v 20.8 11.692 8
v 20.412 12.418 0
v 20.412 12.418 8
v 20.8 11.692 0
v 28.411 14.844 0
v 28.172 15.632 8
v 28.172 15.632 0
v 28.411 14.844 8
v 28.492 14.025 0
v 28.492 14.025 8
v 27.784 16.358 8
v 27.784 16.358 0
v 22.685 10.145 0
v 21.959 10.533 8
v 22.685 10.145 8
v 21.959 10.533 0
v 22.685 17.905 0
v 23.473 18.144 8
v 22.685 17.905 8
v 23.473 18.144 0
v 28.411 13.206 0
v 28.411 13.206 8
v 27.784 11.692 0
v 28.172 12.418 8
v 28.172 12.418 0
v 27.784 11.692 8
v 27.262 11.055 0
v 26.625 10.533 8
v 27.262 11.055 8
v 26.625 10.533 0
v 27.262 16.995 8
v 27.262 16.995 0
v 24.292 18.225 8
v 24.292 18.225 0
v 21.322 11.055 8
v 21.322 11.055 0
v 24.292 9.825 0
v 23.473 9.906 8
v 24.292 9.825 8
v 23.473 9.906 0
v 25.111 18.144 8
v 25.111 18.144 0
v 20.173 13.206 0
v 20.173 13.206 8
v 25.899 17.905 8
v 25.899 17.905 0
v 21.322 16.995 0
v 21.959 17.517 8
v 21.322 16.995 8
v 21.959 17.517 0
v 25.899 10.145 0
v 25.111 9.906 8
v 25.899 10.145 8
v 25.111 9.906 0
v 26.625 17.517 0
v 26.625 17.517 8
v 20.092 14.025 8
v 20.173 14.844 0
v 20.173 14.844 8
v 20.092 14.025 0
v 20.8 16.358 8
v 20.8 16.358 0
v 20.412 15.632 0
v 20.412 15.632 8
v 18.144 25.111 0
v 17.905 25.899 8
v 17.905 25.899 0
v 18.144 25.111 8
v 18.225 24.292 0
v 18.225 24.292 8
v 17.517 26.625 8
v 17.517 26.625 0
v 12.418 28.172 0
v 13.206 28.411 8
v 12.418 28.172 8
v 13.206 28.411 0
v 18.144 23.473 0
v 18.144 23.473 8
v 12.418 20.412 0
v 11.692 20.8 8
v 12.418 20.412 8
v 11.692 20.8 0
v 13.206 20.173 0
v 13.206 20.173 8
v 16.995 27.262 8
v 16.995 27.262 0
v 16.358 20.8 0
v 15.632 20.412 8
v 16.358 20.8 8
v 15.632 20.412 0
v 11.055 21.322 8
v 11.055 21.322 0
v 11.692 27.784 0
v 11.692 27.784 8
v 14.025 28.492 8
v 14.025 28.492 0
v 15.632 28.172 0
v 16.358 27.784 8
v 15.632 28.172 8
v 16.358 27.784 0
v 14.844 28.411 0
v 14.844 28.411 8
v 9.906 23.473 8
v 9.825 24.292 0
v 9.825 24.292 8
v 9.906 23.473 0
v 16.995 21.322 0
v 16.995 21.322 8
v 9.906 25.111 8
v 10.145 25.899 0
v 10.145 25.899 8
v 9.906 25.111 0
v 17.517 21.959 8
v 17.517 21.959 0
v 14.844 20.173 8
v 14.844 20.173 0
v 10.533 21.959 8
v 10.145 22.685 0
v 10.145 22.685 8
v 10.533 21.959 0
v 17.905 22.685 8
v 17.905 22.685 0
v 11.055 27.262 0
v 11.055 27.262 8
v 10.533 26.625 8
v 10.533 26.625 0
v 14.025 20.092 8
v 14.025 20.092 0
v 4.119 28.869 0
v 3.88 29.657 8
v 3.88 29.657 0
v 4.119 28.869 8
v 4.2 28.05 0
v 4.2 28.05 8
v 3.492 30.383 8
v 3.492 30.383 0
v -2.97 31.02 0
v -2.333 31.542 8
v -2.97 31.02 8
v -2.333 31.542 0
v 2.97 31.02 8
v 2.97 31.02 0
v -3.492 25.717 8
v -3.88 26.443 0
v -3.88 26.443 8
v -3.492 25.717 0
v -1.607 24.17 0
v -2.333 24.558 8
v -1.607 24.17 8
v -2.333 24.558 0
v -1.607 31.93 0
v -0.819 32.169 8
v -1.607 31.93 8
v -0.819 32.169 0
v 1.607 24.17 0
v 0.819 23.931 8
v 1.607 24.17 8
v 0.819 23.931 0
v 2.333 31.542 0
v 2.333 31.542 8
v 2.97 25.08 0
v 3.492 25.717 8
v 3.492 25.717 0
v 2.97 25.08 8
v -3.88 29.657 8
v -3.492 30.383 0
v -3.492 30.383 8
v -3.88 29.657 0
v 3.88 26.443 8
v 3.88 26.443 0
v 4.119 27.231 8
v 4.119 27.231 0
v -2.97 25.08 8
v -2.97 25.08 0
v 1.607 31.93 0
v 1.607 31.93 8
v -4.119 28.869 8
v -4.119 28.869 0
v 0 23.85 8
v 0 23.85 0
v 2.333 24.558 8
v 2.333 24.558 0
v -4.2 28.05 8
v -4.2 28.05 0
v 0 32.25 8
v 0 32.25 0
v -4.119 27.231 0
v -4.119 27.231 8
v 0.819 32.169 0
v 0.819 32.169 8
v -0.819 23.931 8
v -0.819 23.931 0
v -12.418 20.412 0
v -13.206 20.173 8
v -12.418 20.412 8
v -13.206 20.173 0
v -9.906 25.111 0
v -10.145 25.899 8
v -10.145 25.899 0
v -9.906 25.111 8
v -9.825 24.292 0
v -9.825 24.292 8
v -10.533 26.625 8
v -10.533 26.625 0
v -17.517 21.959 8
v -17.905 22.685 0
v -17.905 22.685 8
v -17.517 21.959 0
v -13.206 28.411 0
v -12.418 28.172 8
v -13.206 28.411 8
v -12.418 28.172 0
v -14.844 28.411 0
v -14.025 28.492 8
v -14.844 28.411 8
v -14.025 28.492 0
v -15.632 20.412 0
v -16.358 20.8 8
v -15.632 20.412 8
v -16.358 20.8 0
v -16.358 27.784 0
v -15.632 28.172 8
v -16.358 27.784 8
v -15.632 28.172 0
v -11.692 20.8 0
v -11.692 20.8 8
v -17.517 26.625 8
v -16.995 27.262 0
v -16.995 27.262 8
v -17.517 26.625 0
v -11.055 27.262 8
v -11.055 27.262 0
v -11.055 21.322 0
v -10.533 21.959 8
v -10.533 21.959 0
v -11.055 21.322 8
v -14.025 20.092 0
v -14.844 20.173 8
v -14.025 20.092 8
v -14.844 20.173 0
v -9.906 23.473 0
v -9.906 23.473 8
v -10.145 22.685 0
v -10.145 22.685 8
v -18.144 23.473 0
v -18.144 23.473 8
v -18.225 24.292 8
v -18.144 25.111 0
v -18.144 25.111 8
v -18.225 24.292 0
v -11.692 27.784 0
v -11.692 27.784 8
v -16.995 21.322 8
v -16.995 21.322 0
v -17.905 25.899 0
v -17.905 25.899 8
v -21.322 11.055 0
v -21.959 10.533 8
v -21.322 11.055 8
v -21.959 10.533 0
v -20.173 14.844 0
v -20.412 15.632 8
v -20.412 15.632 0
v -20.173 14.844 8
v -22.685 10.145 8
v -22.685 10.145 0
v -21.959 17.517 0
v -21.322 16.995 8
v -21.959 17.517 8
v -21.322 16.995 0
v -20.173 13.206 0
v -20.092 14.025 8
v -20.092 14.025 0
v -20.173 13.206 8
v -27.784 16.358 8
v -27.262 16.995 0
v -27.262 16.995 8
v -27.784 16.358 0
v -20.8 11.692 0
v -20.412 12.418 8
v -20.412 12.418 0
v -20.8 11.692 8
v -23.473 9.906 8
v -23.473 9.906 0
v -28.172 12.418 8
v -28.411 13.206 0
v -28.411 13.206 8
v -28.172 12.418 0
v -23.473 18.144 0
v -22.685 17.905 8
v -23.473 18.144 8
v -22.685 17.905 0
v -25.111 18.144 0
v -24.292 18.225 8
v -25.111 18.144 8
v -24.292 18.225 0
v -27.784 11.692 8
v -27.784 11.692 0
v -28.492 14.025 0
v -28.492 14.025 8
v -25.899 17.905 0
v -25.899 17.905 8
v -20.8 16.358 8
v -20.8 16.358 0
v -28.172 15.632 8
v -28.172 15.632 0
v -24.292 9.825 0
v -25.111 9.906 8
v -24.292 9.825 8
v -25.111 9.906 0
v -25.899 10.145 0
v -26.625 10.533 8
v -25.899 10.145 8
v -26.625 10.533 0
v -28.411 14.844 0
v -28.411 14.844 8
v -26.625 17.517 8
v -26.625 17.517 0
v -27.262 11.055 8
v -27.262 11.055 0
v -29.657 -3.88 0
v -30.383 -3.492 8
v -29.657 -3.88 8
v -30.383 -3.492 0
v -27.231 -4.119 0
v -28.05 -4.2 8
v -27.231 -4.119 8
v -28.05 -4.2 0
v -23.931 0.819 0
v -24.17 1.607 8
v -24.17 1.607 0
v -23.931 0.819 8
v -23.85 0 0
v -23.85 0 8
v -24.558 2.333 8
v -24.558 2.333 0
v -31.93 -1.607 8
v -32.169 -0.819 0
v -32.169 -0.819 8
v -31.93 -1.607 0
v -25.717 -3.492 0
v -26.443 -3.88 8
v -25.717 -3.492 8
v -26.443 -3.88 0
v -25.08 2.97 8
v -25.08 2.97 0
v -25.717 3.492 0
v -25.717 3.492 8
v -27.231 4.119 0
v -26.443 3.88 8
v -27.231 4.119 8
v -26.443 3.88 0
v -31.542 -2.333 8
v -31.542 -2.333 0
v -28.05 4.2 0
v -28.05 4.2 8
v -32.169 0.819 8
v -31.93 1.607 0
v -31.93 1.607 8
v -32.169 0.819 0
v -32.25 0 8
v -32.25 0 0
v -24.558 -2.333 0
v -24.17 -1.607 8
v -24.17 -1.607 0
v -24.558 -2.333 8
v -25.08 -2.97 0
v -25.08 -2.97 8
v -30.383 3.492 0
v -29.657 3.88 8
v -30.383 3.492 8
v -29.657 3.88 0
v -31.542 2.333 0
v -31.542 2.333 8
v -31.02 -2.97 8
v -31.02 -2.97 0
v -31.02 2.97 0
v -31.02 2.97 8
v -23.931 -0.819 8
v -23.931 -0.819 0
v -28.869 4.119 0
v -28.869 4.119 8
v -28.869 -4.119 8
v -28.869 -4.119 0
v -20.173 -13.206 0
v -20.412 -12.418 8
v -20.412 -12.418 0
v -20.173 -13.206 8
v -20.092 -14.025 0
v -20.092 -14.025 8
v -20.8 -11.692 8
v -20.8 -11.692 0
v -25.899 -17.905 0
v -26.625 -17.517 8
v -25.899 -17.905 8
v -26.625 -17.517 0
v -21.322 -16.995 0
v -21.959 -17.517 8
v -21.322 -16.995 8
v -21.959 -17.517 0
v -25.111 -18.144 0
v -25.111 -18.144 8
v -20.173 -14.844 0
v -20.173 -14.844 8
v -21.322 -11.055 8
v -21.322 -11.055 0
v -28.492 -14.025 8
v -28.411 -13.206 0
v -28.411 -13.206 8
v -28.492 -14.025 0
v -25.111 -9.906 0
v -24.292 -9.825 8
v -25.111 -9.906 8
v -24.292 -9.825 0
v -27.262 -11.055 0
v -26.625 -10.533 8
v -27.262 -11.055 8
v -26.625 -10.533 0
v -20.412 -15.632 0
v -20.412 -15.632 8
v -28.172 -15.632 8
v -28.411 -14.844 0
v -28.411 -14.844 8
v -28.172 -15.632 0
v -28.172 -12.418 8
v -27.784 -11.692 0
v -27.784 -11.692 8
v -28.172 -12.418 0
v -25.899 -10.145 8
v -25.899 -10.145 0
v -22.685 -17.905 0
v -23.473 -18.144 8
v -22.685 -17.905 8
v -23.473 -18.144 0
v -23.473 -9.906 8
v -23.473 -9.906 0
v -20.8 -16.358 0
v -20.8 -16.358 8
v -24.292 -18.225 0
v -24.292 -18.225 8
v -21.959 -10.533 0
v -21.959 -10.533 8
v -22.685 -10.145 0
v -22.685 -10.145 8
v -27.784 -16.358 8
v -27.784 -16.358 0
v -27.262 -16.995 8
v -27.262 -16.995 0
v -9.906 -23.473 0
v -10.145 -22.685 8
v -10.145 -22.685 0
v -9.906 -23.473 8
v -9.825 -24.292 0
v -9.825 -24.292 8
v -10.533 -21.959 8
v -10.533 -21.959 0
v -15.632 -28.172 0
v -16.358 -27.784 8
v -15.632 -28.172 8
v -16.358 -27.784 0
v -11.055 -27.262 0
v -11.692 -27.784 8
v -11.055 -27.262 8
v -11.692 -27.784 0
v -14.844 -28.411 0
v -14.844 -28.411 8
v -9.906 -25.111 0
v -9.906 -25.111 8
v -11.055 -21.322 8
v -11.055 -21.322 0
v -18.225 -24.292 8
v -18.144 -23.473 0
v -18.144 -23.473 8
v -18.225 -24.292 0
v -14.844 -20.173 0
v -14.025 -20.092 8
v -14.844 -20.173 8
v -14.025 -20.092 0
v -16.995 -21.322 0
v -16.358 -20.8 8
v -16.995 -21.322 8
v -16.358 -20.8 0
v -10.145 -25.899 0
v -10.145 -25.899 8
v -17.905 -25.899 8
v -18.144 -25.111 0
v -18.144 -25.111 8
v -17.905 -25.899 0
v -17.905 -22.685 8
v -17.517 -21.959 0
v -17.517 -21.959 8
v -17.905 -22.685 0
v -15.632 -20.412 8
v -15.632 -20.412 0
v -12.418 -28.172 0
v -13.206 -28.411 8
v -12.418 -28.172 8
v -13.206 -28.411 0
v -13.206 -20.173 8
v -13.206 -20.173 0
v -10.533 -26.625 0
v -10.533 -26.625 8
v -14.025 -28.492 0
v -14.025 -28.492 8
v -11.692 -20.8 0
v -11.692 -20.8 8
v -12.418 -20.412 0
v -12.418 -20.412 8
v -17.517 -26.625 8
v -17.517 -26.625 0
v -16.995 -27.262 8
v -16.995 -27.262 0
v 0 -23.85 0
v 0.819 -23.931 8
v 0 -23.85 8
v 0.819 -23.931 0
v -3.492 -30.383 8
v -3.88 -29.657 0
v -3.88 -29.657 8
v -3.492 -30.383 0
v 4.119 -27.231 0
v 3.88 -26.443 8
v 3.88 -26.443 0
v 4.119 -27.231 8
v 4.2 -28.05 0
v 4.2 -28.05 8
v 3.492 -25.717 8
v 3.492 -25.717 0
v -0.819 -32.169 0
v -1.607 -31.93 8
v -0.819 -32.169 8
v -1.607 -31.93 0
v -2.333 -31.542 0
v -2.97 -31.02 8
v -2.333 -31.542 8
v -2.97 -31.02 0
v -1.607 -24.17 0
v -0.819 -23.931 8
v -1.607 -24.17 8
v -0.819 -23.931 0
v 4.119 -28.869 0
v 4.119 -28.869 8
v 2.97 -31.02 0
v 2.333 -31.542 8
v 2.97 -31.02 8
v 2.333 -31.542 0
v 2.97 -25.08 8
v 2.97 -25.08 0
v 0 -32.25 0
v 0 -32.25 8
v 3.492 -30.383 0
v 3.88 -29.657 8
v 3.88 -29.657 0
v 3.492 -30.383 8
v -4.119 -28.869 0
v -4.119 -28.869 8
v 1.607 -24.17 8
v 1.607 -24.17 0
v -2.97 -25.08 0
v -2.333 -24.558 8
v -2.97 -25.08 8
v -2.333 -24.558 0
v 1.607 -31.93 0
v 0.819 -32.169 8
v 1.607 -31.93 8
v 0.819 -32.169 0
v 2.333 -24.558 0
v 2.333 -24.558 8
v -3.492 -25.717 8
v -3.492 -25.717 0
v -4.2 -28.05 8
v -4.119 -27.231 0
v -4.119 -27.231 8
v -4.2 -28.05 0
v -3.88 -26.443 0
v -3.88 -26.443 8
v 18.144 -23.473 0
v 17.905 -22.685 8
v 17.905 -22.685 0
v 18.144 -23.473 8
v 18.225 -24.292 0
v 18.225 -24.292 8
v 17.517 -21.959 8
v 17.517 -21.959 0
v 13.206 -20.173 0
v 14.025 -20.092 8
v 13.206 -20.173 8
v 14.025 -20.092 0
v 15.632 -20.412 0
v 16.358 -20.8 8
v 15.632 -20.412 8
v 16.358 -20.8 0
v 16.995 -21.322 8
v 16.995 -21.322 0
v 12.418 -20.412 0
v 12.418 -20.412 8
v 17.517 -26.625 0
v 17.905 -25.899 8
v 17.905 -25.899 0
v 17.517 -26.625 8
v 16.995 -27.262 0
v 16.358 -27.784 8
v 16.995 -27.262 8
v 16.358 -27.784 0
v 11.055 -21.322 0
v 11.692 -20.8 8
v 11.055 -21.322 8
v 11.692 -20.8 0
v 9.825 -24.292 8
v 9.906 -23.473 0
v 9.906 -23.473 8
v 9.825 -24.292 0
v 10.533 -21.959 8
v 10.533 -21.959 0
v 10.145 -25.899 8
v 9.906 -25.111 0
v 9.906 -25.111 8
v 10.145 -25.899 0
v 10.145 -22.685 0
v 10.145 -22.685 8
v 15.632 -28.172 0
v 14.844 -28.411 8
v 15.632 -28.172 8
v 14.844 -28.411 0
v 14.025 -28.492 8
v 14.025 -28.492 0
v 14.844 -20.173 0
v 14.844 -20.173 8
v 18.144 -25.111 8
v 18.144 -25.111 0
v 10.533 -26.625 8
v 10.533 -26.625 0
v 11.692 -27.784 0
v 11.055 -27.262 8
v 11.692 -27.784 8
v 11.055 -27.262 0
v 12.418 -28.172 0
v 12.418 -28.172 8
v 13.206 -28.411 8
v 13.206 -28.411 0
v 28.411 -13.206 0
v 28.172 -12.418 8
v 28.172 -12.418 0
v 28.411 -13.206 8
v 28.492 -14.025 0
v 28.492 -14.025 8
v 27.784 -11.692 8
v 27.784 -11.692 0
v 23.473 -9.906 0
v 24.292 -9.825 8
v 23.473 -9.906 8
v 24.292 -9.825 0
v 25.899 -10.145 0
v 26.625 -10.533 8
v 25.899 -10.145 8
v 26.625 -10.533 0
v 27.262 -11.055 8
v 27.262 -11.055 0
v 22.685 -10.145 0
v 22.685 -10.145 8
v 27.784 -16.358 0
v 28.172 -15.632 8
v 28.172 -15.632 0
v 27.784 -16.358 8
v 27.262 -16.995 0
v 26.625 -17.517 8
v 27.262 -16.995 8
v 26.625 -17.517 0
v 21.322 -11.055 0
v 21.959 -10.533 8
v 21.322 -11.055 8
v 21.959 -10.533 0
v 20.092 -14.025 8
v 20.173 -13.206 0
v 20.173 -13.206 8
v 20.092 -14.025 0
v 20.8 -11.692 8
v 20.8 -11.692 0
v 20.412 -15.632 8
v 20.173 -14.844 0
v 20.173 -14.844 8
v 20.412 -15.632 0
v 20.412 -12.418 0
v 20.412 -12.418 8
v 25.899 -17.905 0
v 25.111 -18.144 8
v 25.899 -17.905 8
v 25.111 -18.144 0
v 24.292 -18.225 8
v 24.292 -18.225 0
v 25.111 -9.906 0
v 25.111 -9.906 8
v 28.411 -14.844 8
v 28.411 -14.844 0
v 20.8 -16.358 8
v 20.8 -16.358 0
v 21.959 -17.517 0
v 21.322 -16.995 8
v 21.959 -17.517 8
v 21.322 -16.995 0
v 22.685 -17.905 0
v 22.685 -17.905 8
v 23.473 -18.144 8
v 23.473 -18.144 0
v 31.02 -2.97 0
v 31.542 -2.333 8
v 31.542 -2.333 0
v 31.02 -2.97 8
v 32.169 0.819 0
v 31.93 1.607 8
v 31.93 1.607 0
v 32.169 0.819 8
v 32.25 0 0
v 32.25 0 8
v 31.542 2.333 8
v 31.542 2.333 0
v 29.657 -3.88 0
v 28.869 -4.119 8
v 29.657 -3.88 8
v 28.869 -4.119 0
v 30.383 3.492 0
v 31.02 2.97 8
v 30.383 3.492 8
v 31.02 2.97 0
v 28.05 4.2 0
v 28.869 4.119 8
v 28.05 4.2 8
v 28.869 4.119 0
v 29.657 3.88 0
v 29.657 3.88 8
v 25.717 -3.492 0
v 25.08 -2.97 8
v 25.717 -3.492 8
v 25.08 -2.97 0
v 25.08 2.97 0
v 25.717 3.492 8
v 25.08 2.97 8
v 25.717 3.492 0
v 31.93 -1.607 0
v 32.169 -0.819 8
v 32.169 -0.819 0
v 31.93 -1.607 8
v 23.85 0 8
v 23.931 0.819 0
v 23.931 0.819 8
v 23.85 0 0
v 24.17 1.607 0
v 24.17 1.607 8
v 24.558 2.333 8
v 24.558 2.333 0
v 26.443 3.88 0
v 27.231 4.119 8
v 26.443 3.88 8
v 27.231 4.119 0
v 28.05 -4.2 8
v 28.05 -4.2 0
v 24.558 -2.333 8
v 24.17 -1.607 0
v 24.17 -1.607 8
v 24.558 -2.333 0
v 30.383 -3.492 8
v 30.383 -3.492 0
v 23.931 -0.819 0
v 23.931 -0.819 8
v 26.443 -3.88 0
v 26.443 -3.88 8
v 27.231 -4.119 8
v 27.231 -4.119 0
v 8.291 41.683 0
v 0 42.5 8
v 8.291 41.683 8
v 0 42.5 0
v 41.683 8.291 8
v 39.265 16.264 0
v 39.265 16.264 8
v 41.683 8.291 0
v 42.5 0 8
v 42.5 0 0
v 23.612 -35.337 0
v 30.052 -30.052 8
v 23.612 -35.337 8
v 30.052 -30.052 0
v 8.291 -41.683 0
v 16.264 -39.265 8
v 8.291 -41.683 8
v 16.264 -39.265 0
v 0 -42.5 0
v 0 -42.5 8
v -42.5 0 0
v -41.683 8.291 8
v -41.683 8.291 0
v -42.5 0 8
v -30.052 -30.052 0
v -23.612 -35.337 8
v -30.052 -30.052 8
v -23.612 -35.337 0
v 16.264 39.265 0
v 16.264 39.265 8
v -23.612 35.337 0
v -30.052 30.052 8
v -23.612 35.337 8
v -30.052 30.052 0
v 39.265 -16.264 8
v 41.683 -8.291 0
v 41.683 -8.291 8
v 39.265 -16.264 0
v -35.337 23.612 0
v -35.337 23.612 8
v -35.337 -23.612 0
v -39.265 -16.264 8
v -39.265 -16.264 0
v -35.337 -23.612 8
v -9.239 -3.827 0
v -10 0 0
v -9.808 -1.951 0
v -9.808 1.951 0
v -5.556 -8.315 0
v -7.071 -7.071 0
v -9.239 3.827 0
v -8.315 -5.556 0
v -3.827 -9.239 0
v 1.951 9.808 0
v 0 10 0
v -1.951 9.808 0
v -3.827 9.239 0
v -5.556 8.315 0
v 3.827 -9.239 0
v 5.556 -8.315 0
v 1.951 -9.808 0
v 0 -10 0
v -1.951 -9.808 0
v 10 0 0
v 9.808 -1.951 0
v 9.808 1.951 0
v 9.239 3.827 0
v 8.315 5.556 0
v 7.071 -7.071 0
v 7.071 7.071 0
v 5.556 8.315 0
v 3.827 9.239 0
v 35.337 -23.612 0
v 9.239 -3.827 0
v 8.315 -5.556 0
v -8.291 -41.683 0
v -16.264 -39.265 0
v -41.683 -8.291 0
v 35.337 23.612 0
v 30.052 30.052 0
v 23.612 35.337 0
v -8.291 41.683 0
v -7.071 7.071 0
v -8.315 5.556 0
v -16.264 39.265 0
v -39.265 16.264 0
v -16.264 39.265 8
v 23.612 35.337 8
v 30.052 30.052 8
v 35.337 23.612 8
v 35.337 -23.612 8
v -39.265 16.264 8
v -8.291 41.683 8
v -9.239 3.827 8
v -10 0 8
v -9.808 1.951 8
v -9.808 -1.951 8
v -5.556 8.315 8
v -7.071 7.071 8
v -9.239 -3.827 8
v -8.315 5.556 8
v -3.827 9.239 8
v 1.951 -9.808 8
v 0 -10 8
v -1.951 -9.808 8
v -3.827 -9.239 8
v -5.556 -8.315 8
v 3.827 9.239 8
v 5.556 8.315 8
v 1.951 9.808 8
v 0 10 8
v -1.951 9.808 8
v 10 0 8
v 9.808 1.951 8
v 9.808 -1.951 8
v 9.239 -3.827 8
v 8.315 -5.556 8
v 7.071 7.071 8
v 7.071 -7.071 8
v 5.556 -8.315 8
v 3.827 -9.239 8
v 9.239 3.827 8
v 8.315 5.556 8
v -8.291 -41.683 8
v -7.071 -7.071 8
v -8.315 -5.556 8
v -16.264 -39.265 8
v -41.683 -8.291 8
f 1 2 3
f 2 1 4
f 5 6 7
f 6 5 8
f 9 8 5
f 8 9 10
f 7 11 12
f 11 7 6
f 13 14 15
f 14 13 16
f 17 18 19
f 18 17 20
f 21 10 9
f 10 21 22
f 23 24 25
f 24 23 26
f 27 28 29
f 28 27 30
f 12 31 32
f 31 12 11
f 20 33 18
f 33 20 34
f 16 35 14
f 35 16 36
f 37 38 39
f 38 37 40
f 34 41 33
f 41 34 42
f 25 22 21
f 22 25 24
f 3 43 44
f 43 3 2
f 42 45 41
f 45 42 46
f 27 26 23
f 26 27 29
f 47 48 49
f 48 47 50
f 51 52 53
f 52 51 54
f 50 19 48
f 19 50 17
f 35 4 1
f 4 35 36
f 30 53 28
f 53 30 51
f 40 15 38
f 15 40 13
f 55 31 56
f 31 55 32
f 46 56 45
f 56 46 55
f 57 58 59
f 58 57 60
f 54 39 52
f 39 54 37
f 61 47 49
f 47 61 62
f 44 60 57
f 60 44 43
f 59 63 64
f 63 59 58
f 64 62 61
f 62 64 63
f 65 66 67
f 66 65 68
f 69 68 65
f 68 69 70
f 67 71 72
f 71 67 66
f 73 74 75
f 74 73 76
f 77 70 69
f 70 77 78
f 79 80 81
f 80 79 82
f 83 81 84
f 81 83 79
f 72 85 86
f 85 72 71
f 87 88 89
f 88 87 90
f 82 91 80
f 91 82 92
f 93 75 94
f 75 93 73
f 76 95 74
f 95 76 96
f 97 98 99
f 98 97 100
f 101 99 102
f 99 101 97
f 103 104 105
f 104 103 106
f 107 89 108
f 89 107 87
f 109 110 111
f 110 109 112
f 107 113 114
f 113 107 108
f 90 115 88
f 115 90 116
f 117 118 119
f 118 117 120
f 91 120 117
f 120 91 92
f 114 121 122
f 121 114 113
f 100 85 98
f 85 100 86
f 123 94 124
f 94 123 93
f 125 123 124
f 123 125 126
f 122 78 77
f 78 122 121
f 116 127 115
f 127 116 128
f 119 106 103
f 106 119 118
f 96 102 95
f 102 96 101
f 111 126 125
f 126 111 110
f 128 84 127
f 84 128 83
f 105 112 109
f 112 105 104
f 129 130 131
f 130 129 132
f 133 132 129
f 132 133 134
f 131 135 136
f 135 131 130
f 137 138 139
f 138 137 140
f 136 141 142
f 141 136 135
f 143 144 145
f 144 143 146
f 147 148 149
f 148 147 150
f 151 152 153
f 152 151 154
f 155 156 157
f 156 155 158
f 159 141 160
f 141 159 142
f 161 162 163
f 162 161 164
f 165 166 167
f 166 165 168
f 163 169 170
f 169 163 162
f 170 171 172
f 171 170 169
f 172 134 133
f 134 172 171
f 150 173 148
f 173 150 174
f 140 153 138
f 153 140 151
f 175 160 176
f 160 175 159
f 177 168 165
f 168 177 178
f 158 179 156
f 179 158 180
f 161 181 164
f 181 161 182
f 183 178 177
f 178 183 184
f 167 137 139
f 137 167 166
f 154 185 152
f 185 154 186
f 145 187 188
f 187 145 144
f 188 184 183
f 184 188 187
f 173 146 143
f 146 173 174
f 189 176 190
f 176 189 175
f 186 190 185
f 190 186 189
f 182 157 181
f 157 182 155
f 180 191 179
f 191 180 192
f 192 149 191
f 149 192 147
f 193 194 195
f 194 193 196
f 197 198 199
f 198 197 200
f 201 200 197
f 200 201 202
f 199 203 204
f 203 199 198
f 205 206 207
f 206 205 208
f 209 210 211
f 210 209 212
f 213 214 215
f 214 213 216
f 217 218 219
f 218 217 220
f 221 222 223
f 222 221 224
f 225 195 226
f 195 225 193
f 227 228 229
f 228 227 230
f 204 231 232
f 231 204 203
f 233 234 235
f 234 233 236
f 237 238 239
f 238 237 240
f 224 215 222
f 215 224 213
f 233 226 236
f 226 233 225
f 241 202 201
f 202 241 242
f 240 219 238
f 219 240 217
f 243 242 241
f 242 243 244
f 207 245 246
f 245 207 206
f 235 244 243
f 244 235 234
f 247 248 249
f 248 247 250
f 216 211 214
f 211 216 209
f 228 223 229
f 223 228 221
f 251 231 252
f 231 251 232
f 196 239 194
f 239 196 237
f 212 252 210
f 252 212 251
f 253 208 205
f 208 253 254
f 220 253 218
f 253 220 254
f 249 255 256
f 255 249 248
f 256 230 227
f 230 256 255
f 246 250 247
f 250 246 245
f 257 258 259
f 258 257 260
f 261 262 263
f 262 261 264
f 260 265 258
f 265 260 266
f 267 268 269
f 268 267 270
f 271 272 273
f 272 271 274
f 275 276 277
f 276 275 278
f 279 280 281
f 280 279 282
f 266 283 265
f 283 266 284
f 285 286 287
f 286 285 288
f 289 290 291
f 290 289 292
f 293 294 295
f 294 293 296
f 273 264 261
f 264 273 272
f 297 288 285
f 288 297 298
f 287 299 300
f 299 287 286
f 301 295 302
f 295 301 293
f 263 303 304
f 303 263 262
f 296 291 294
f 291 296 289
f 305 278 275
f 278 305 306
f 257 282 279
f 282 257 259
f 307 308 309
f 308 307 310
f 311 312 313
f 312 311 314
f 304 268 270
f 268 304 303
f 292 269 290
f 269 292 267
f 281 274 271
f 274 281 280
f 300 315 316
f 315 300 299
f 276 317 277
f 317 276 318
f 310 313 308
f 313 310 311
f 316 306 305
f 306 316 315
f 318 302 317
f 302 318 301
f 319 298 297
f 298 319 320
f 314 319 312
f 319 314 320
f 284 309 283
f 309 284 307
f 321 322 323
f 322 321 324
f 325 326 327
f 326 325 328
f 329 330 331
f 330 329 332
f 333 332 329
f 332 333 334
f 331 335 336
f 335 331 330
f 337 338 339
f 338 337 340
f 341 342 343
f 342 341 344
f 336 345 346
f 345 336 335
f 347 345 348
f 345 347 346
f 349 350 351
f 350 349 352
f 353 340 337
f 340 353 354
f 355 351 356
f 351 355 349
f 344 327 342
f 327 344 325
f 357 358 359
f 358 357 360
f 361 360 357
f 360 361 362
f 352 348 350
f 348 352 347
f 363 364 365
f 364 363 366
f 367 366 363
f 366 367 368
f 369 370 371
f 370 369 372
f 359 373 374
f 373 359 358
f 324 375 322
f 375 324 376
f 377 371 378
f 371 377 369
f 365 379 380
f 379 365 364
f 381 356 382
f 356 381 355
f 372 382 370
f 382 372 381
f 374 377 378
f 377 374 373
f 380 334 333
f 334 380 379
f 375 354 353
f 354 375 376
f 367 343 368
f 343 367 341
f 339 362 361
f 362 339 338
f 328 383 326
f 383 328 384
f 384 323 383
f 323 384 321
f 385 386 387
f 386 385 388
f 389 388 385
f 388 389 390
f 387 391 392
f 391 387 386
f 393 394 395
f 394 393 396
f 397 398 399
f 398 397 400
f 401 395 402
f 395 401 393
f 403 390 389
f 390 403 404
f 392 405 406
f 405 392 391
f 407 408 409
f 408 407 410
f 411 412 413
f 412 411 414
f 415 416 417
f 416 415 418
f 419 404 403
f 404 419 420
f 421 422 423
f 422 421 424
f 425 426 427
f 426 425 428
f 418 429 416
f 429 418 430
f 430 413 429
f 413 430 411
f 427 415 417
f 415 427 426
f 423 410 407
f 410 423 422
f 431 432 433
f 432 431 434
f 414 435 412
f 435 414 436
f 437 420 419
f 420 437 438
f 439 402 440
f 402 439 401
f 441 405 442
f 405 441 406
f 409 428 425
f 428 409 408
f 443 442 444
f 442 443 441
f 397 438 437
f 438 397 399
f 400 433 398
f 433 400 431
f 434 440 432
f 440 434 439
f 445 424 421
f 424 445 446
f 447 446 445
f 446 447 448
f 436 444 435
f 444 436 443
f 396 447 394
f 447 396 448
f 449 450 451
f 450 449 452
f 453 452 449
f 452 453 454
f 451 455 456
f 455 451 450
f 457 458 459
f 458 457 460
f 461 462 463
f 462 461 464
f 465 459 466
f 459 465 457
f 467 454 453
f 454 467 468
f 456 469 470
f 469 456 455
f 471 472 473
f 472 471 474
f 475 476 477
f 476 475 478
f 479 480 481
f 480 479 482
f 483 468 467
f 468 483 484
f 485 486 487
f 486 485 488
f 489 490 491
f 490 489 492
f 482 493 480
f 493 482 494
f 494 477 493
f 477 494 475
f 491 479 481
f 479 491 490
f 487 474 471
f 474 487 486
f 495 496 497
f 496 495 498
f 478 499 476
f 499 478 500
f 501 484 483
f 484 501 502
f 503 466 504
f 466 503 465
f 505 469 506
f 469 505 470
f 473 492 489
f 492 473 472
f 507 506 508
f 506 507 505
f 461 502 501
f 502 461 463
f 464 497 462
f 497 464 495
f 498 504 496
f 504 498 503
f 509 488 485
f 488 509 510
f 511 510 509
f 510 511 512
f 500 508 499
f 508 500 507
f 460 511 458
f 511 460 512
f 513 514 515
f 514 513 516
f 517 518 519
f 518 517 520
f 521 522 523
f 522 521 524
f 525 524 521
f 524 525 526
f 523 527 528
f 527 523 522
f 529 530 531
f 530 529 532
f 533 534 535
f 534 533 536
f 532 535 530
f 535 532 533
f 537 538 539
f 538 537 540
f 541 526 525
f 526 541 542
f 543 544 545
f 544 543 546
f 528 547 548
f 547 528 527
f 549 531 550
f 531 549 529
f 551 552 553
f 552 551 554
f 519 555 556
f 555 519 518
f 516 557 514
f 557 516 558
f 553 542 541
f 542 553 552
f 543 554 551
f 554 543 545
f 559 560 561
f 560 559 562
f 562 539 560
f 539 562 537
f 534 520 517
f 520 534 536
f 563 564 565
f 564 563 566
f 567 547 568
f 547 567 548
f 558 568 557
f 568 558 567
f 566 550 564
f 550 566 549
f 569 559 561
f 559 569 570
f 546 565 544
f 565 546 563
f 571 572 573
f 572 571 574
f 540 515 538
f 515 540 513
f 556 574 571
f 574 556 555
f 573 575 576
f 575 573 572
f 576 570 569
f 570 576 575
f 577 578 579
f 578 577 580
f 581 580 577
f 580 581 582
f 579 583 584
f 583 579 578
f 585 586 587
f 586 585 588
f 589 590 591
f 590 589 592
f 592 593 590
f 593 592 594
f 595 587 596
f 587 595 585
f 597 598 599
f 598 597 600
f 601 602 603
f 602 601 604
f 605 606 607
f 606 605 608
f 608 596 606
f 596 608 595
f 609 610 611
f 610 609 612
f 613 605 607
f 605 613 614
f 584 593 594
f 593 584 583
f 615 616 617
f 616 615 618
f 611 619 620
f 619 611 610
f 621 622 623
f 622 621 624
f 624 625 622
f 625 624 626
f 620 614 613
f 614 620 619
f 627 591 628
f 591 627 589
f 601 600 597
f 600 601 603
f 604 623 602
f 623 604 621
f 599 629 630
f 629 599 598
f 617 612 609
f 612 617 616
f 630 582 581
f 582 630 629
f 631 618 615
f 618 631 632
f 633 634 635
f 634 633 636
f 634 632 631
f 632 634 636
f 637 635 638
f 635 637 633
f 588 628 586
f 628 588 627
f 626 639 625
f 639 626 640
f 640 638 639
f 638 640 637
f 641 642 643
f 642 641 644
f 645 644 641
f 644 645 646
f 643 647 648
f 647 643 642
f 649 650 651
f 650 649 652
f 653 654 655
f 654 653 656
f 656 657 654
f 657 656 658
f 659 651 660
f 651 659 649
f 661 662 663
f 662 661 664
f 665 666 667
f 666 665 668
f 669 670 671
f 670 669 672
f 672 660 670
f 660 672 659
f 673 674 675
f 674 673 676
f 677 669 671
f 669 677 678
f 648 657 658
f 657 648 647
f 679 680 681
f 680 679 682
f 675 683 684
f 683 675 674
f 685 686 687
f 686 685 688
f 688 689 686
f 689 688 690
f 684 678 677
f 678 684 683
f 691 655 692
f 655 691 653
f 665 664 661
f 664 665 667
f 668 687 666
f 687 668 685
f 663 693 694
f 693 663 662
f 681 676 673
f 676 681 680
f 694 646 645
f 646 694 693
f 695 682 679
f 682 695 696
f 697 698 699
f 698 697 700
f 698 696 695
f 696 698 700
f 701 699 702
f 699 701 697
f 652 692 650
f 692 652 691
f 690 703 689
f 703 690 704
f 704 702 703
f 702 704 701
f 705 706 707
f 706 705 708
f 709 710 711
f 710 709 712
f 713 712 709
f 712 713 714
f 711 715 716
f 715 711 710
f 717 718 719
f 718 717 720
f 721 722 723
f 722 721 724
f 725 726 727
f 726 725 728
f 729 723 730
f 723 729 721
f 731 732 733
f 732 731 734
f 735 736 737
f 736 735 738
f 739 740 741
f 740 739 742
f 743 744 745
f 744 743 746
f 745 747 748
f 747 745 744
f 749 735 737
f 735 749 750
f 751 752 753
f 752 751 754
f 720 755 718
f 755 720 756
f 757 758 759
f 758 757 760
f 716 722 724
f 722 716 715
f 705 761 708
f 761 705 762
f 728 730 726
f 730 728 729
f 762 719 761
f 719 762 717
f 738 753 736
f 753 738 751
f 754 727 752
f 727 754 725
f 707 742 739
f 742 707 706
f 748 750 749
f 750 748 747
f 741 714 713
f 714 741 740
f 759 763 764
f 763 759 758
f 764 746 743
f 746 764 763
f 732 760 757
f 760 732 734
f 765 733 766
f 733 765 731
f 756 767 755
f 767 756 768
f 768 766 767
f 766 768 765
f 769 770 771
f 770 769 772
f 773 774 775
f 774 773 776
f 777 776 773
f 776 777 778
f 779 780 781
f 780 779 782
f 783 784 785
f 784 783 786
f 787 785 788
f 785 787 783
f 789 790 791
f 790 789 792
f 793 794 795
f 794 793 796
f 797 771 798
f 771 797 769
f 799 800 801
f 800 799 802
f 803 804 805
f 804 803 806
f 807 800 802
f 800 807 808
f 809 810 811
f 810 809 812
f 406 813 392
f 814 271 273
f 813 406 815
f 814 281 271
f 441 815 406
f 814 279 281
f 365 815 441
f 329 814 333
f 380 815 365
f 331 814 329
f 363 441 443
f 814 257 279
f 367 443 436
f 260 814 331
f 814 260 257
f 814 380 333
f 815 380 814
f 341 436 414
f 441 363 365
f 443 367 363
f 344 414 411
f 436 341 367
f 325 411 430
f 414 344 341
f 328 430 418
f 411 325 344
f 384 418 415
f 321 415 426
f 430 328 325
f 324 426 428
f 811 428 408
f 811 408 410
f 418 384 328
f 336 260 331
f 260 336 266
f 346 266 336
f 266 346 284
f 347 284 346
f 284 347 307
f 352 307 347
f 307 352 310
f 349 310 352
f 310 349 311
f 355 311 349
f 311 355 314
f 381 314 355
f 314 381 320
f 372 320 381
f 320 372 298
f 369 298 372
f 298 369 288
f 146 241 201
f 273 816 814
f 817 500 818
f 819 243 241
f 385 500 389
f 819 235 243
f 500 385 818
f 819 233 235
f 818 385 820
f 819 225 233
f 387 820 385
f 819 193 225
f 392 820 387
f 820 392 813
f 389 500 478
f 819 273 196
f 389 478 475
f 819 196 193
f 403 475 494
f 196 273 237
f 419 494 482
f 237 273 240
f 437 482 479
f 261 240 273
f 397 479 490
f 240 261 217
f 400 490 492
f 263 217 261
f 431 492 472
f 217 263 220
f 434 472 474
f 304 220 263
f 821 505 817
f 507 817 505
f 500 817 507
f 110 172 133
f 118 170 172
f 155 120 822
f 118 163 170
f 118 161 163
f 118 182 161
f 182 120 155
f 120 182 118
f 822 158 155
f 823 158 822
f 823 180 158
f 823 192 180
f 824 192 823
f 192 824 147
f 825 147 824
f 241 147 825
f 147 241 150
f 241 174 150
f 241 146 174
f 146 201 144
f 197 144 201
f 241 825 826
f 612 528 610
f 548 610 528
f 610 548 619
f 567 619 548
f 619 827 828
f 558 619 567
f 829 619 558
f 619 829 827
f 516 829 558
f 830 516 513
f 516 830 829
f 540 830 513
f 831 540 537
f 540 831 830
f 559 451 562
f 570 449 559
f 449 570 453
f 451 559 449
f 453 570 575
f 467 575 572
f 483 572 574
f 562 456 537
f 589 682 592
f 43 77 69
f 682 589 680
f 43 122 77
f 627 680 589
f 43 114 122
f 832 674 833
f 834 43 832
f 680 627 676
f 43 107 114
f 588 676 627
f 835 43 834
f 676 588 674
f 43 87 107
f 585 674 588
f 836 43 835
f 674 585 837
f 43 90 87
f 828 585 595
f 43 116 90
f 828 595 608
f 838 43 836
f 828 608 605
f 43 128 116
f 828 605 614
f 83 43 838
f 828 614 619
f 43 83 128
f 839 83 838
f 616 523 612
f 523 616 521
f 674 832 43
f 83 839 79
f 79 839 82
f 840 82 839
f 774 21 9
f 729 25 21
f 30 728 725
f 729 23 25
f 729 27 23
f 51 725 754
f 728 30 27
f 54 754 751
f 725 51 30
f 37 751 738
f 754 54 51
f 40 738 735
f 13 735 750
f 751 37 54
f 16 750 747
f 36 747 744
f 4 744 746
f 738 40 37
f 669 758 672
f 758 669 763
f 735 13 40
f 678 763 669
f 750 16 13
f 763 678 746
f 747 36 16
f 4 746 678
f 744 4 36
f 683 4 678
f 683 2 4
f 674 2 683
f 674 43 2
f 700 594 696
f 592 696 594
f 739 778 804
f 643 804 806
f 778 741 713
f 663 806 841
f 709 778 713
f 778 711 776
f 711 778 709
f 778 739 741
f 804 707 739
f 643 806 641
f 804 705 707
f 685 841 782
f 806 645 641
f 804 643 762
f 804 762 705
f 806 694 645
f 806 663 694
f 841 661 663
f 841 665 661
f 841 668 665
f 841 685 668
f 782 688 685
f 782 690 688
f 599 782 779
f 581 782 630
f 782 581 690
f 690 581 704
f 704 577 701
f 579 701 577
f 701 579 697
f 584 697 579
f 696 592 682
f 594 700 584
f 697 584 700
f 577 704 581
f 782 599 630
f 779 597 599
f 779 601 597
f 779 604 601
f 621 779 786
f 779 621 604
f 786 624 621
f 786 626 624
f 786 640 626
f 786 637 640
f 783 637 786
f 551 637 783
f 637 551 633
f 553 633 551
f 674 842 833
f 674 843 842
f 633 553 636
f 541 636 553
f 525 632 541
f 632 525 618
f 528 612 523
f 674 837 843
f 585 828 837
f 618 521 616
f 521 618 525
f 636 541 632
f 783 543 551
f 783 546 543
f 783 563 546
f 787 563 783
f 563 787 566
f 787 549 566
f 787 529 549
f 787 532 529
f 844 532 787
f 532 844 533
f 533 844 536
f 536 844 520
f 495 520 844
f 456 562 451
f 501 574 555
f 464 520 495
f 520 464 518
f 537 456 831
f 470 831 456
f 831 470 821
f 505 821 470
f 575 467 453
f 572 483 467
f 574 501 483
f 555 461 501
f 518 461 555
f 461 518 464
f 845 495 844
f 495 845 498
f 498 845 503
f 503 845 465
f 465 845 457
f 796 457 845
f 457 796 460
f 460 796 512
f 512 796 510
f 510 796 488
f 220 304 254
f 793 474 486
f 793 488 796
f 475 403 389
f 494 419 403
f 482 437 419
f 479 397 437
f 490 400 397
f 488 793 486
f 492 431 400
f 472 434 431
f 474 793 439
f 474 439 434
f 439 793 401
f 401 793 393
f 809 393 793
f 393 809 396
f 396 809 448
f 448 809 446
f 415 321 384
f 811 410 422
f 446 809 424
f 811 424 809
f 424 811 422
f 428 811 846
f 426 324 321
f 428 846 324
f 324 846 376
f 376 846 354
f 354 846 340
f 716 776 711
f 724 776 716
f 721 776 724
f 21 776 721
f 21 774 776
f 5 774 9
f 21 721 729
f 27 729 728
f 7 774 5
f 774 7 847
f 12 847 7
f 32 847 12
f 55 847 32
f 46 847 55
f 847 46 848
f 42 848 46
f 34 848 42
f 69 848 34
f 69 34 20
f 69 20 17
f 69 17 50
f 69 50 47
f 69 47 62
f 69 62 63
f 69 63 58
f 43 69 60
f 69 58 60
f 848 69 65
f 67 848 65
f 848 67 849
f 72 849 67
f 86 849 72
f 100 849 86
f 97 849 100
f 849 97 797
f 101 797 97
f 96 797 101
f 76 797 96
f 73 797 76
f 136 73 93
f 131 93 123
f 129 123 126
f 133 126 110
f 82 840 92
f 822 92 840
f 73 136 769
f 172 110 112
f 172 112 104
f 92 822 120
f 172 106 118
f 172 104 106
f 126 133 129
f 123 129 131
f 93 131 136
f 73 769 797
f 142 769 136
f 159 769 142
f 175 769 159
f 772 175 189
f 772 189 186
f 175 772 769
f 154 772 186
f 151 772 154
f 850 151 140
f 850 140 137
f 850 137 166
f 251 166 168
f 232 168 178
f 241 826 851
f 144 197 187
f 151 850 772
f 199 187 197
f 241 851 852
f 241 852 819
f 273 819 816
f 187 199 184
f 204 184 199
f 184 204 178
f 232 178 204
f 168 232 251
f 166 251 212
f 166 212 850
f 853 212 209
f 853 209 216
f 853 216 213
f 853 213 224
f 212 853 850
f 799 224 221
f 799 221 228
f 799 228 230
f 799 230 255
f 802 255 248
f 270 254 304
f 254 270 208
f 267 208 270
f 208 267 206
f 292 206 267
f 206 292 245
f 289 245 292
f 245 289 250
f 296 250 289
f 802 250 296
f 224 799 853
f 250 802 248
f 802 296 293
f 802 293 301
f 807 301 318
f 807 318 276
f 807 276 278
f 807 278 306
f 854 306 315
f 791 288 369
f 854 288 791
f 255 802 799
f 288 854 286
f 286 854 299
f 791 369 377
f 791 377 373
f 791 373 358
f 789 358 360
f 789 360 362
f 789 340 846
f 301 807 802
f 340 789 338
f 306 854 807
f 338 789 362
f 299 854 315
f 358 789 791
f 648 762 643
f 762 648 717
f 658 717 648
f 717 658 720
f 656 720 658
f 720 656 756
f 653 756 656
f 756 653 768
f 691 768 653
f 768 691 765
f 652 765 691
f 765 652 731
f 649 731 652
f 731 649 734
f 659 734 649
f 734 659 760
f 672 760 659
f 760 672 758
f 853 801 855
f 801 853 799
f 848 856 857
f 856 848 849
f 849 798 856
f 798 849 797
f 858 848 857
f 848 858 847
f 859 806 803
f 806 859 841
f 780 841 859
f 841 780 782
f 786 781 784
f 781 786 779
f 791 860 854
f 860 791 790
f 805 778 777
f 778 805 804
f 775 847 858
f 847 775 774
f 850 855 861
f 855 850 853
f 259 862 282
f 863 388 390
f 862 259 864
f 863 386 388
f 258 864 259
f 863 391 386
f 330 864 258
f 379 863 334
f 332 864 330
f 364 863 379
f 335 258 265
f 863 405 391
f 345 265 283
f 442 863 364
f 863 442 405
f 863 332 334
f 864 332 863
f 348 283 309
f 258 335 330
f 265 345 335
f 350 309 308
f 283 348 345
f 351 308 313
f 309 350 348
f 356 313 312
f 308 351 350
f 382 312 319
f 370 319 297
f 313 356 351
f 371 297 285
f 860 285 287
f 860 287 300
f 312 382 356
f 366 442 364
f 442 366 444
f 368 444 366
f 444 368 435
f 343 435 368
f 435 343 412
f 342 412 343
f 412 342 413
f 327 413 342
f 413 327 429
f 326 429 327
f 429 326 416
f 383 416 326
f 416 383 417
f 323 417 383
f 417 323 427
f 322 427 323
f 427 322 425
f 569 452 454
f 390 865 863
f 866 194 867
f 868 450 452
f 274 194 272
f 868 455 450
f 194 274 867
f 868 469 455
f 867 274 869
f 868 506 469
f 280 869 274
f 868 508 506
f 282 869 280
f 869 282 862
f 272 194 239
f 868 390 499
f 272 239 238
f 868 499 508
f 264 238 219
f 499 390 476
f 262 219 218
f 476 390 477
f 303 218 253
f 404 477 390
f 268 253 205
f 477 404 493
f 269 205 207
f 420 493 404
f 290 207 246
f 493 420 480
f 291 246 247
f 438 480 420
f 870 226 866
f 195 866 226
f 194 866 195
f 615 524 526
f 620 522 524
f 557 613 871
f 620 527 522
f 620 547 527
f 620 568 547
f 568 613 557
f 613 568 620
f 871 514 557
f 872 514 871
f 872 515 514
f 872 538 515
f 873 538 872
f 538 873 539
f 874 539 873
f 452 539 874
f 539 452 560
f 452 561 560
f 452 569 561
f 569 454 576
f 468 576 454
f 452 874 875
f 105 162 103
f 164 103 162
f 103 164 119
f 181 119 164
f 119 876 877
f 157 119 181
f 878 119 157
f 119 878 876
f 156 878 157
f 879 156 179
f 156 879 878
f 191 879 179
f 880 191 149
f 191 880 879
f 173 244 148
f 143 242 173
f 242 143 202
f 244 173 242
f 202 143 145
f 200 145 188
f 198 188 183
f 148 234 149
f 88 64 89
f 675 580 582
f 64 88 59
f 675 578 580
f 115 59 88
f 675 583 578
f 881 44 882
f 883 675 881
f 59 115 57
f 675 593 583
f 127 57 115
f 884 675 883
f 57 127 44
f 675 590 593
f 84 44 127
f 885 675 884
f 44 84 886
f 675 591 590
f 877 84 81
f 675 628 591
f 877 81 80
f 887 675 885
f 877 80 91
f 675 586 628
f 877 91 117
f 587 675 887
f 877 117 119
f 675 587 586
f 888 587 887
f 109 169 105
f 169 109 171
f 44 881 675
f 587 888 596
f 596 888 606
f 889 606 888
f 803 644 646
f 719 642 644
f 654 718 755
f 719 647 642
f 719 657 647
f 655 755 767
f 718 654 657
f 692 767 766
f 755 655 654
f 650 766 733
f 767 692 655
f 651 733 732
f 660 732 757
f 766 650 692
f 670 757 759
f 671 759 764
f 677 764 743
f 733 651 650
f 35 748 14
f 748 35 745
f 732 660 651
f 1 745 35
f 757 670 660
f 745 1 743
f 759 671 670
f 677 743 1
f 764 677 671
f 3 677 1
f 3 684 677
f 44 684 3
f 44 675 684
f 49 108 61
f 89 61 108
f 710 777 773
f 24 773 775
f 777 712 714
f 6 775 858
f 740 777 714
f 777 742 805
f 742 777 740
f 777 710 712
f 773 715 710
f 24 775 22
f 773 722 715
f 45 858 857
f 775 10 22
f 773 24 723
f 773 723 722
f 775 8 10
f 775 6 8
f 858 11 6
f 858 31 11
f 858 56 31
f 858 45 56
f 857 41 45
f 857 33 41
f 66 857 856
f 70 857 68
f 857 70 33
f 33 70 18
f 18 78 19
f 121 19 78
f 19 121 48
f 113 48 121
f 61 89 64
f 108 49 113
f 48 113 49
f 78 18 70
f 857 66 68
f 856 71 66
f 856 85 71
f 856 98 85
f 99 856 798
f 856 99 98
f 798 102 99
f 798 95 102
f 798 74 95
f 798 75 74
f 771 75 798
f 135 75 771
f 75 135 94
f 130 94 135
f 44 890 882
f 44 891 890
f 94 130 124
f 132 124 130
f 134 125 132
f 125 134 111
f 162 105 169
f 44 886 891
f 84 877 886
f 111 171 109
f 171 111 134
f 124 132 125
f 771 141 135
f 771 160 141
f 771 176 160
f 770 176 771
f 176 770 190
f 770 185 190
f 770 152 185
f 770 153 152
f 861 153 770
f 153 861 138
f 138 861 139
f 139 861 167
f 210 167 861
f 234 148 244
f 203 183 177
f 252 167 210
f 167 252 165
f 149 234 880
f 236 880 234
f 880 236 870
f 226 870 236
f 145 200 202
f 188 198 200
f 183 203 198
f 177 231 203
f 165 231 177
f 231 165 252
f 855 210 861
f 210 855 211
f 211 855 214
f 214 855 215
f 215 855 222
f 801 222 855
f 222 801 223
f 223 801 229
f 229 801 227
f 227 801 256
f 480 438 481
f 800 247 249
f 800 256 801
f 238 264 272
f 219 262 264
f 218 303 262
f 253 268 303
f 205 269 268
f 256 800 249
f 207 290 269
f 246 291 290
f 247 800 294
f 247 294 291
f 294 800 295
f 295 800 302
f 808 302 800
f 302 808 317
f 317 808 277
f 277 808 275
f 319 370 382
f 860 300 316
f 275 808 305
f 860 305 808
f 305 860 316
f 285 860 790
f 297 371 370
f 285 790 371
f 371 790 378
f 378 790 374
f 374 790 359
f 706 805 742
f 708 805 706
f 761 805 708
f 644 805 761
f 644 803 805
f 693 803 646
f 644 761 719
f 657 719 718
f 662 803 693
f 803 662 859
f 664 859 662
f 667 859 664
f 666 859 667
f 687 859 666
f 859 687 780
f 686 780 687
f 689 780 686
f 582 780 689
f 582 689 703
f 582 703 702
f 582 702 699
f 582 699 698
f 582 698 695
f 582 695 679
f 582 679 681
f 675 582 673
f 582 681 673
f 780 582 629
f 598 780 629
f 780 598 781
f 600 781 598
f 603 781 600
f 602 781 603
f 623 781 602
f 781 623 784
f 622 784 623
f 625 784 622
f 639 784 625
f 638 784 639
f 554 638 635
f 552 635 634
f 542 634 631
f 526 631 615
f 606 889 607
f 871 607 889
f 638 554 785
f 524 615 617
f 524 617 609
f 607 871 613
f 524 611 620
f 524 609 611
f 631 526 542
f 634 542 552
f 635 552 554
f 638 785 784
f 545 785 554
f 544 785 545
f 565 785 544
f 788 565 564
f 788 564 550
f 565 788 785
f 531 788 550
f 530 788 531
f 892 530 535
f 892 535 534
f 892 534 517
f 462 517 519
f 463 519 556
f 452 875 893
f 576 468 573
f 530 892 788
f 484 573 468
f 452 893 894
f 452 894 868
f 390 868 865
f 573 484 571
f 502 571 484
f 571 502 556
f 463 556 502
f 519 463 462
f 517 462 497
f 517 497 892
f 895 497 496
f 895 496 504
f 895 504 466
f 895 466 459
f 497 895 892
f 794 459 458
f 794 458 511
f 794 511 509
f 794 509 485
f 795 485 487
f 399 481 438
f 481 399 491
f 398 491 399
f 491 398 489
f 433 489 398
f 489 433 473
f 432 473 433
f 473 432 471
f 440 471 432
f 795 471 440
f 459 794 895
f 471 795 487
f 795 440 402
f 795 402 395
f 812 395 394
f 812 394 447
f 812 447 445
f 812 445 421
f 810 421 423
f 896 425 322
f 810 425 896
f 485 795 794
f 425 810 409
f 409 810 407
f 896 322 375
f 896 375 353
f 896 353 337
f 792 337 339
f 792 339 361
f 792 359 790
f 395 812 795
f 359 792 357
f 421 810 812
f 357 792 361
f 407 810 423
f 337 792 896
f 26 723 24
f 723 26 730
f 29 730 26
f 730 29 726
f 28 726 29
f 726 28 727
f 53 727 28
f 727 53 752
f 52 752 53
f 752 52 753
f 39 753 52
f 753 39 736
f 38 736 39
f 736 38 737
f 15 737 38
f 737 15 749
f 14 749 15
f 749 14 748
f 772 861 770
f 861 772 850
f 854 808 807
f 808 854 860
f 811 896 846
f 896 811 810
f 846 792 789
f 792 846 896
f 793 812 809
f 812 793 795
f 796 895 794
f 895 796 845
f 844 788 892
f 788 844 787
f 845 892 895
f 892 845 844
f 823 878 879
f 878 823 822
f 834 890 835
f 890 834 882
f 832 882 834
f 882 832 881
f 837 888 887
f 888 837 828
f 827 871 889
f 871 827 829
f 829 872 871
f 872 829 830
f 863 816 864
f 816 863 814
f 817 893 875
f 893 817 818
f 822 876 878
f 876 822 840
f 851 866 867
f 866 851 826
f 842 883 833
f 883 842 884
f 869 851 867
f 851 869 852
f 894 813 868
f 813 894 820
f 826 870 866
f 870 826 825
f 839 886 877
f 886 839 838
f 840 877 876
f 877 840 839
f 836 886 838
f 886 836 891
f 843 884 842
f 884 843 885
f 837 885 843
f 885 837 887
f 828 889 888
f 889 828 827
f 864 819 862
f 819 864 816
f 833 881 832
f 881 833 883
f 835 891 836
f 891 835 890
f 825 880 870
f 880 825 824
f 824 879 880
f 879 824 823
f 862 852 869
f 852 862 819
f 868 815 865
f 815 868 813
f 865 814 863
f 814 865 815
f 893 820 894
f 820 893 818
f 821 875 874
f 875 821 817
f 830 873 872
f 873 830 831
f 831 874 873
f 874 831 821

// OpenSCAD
$fn = 32;

// ----------------------------------------------------------------------
// Flange Ø85 x 8
// 12 holes on a Ø56.1 bolt circle, bolted joints
// ----------------------------------------------------------------------

// --- parameters (mm) ---
flange_d = 85;   // outside diameter of the flange
thickness = 8;   // flange thickness
holes = 12;      // number of bolt holes
pcd = 56.1;      // bolt circle diameter
start_deg = 30;  // angle of the first hole, from +X
hole_d = 8.4;    // bolt hole diameter
bore_d = 20;     // central through bore
hub_d = 30;      // hub outside diameter
hub_h = 0;       // hub height above the flange face (0 = no hub)

// --- derived feature positions (mm) ---
height = thickness + hub_h;  // = 8   overall height of the part
pcd_r = pcd / 2;             // = 28.05   bolt circle radius
hole_step = 360 / holes;     // = 30   angular pitch
feature_centers = [
  [pcd_r * cos(start_deg + 0 * hole_step), pcd_r * sin(start_deg + 0 * hole_step)],
  [pcd_r * cos(start_deg + 1 * hole_step), pcd_r * sin(start_deg + 1 * hole_step)],
  [pcd_r * cos(start_deg + 2 * hole_step), pcd_r * sin(start_deg + 2 * hole_step)],
  [pcd_r * cos(start_deg + 3 * hole_step), pcd_r * sin(start_deg + 3 * hole_step)],
  [pcd_r * cos(start_deg + 4 * hole_step), pcd_r * sin(start_deg + 4 * hole_step)],
  [pcd_r * cos(start_deg + 5 * hole_step), pcd_r * sin(start_deg + 5 * hole_step)],
  [pcd_r * cos(start_deg + 6 * hole_step), pcd_r * sin(start_deg + 6 * hole_step)],
  [pcd_r * cos(start_deg + 7 * hole_step), pcd_r * sin(start_deg + 7 * hole_step)],
  [pcd_r * cos(start_deg + 8 * hole_step), pcd_r * sin(start_deg + 8 * hole_step)],
  [pcd_r * cos(start_deg + 9 * hole_step), pcd_r * sin(start_deg + 9 * hole_step)],
  [pcd_r * cos(start_deg + 10 * hole_step), pcd_r * sin(start_deg + 10 * hole_step)],
  [pcd_r * cos(start_deg + 11 * hole_step), pcd_r * sin(start_deg + 11 * hole_step)]
];   // bolt hole centres on the pitch circle

// flange disc, every hole and the bore cut straight through
difference() {
  union() {
    cylinder(d = flange_d, h = thickness);
  }
  translate([0, 0, -1]) cylinder(d = bore_d, h = height + 2);  // bore, through
  for (centre = feature_centers)
    translate([centre[0], centre[1], -1]) cylinder(d = hole_d, h = thickness + 2);
}
